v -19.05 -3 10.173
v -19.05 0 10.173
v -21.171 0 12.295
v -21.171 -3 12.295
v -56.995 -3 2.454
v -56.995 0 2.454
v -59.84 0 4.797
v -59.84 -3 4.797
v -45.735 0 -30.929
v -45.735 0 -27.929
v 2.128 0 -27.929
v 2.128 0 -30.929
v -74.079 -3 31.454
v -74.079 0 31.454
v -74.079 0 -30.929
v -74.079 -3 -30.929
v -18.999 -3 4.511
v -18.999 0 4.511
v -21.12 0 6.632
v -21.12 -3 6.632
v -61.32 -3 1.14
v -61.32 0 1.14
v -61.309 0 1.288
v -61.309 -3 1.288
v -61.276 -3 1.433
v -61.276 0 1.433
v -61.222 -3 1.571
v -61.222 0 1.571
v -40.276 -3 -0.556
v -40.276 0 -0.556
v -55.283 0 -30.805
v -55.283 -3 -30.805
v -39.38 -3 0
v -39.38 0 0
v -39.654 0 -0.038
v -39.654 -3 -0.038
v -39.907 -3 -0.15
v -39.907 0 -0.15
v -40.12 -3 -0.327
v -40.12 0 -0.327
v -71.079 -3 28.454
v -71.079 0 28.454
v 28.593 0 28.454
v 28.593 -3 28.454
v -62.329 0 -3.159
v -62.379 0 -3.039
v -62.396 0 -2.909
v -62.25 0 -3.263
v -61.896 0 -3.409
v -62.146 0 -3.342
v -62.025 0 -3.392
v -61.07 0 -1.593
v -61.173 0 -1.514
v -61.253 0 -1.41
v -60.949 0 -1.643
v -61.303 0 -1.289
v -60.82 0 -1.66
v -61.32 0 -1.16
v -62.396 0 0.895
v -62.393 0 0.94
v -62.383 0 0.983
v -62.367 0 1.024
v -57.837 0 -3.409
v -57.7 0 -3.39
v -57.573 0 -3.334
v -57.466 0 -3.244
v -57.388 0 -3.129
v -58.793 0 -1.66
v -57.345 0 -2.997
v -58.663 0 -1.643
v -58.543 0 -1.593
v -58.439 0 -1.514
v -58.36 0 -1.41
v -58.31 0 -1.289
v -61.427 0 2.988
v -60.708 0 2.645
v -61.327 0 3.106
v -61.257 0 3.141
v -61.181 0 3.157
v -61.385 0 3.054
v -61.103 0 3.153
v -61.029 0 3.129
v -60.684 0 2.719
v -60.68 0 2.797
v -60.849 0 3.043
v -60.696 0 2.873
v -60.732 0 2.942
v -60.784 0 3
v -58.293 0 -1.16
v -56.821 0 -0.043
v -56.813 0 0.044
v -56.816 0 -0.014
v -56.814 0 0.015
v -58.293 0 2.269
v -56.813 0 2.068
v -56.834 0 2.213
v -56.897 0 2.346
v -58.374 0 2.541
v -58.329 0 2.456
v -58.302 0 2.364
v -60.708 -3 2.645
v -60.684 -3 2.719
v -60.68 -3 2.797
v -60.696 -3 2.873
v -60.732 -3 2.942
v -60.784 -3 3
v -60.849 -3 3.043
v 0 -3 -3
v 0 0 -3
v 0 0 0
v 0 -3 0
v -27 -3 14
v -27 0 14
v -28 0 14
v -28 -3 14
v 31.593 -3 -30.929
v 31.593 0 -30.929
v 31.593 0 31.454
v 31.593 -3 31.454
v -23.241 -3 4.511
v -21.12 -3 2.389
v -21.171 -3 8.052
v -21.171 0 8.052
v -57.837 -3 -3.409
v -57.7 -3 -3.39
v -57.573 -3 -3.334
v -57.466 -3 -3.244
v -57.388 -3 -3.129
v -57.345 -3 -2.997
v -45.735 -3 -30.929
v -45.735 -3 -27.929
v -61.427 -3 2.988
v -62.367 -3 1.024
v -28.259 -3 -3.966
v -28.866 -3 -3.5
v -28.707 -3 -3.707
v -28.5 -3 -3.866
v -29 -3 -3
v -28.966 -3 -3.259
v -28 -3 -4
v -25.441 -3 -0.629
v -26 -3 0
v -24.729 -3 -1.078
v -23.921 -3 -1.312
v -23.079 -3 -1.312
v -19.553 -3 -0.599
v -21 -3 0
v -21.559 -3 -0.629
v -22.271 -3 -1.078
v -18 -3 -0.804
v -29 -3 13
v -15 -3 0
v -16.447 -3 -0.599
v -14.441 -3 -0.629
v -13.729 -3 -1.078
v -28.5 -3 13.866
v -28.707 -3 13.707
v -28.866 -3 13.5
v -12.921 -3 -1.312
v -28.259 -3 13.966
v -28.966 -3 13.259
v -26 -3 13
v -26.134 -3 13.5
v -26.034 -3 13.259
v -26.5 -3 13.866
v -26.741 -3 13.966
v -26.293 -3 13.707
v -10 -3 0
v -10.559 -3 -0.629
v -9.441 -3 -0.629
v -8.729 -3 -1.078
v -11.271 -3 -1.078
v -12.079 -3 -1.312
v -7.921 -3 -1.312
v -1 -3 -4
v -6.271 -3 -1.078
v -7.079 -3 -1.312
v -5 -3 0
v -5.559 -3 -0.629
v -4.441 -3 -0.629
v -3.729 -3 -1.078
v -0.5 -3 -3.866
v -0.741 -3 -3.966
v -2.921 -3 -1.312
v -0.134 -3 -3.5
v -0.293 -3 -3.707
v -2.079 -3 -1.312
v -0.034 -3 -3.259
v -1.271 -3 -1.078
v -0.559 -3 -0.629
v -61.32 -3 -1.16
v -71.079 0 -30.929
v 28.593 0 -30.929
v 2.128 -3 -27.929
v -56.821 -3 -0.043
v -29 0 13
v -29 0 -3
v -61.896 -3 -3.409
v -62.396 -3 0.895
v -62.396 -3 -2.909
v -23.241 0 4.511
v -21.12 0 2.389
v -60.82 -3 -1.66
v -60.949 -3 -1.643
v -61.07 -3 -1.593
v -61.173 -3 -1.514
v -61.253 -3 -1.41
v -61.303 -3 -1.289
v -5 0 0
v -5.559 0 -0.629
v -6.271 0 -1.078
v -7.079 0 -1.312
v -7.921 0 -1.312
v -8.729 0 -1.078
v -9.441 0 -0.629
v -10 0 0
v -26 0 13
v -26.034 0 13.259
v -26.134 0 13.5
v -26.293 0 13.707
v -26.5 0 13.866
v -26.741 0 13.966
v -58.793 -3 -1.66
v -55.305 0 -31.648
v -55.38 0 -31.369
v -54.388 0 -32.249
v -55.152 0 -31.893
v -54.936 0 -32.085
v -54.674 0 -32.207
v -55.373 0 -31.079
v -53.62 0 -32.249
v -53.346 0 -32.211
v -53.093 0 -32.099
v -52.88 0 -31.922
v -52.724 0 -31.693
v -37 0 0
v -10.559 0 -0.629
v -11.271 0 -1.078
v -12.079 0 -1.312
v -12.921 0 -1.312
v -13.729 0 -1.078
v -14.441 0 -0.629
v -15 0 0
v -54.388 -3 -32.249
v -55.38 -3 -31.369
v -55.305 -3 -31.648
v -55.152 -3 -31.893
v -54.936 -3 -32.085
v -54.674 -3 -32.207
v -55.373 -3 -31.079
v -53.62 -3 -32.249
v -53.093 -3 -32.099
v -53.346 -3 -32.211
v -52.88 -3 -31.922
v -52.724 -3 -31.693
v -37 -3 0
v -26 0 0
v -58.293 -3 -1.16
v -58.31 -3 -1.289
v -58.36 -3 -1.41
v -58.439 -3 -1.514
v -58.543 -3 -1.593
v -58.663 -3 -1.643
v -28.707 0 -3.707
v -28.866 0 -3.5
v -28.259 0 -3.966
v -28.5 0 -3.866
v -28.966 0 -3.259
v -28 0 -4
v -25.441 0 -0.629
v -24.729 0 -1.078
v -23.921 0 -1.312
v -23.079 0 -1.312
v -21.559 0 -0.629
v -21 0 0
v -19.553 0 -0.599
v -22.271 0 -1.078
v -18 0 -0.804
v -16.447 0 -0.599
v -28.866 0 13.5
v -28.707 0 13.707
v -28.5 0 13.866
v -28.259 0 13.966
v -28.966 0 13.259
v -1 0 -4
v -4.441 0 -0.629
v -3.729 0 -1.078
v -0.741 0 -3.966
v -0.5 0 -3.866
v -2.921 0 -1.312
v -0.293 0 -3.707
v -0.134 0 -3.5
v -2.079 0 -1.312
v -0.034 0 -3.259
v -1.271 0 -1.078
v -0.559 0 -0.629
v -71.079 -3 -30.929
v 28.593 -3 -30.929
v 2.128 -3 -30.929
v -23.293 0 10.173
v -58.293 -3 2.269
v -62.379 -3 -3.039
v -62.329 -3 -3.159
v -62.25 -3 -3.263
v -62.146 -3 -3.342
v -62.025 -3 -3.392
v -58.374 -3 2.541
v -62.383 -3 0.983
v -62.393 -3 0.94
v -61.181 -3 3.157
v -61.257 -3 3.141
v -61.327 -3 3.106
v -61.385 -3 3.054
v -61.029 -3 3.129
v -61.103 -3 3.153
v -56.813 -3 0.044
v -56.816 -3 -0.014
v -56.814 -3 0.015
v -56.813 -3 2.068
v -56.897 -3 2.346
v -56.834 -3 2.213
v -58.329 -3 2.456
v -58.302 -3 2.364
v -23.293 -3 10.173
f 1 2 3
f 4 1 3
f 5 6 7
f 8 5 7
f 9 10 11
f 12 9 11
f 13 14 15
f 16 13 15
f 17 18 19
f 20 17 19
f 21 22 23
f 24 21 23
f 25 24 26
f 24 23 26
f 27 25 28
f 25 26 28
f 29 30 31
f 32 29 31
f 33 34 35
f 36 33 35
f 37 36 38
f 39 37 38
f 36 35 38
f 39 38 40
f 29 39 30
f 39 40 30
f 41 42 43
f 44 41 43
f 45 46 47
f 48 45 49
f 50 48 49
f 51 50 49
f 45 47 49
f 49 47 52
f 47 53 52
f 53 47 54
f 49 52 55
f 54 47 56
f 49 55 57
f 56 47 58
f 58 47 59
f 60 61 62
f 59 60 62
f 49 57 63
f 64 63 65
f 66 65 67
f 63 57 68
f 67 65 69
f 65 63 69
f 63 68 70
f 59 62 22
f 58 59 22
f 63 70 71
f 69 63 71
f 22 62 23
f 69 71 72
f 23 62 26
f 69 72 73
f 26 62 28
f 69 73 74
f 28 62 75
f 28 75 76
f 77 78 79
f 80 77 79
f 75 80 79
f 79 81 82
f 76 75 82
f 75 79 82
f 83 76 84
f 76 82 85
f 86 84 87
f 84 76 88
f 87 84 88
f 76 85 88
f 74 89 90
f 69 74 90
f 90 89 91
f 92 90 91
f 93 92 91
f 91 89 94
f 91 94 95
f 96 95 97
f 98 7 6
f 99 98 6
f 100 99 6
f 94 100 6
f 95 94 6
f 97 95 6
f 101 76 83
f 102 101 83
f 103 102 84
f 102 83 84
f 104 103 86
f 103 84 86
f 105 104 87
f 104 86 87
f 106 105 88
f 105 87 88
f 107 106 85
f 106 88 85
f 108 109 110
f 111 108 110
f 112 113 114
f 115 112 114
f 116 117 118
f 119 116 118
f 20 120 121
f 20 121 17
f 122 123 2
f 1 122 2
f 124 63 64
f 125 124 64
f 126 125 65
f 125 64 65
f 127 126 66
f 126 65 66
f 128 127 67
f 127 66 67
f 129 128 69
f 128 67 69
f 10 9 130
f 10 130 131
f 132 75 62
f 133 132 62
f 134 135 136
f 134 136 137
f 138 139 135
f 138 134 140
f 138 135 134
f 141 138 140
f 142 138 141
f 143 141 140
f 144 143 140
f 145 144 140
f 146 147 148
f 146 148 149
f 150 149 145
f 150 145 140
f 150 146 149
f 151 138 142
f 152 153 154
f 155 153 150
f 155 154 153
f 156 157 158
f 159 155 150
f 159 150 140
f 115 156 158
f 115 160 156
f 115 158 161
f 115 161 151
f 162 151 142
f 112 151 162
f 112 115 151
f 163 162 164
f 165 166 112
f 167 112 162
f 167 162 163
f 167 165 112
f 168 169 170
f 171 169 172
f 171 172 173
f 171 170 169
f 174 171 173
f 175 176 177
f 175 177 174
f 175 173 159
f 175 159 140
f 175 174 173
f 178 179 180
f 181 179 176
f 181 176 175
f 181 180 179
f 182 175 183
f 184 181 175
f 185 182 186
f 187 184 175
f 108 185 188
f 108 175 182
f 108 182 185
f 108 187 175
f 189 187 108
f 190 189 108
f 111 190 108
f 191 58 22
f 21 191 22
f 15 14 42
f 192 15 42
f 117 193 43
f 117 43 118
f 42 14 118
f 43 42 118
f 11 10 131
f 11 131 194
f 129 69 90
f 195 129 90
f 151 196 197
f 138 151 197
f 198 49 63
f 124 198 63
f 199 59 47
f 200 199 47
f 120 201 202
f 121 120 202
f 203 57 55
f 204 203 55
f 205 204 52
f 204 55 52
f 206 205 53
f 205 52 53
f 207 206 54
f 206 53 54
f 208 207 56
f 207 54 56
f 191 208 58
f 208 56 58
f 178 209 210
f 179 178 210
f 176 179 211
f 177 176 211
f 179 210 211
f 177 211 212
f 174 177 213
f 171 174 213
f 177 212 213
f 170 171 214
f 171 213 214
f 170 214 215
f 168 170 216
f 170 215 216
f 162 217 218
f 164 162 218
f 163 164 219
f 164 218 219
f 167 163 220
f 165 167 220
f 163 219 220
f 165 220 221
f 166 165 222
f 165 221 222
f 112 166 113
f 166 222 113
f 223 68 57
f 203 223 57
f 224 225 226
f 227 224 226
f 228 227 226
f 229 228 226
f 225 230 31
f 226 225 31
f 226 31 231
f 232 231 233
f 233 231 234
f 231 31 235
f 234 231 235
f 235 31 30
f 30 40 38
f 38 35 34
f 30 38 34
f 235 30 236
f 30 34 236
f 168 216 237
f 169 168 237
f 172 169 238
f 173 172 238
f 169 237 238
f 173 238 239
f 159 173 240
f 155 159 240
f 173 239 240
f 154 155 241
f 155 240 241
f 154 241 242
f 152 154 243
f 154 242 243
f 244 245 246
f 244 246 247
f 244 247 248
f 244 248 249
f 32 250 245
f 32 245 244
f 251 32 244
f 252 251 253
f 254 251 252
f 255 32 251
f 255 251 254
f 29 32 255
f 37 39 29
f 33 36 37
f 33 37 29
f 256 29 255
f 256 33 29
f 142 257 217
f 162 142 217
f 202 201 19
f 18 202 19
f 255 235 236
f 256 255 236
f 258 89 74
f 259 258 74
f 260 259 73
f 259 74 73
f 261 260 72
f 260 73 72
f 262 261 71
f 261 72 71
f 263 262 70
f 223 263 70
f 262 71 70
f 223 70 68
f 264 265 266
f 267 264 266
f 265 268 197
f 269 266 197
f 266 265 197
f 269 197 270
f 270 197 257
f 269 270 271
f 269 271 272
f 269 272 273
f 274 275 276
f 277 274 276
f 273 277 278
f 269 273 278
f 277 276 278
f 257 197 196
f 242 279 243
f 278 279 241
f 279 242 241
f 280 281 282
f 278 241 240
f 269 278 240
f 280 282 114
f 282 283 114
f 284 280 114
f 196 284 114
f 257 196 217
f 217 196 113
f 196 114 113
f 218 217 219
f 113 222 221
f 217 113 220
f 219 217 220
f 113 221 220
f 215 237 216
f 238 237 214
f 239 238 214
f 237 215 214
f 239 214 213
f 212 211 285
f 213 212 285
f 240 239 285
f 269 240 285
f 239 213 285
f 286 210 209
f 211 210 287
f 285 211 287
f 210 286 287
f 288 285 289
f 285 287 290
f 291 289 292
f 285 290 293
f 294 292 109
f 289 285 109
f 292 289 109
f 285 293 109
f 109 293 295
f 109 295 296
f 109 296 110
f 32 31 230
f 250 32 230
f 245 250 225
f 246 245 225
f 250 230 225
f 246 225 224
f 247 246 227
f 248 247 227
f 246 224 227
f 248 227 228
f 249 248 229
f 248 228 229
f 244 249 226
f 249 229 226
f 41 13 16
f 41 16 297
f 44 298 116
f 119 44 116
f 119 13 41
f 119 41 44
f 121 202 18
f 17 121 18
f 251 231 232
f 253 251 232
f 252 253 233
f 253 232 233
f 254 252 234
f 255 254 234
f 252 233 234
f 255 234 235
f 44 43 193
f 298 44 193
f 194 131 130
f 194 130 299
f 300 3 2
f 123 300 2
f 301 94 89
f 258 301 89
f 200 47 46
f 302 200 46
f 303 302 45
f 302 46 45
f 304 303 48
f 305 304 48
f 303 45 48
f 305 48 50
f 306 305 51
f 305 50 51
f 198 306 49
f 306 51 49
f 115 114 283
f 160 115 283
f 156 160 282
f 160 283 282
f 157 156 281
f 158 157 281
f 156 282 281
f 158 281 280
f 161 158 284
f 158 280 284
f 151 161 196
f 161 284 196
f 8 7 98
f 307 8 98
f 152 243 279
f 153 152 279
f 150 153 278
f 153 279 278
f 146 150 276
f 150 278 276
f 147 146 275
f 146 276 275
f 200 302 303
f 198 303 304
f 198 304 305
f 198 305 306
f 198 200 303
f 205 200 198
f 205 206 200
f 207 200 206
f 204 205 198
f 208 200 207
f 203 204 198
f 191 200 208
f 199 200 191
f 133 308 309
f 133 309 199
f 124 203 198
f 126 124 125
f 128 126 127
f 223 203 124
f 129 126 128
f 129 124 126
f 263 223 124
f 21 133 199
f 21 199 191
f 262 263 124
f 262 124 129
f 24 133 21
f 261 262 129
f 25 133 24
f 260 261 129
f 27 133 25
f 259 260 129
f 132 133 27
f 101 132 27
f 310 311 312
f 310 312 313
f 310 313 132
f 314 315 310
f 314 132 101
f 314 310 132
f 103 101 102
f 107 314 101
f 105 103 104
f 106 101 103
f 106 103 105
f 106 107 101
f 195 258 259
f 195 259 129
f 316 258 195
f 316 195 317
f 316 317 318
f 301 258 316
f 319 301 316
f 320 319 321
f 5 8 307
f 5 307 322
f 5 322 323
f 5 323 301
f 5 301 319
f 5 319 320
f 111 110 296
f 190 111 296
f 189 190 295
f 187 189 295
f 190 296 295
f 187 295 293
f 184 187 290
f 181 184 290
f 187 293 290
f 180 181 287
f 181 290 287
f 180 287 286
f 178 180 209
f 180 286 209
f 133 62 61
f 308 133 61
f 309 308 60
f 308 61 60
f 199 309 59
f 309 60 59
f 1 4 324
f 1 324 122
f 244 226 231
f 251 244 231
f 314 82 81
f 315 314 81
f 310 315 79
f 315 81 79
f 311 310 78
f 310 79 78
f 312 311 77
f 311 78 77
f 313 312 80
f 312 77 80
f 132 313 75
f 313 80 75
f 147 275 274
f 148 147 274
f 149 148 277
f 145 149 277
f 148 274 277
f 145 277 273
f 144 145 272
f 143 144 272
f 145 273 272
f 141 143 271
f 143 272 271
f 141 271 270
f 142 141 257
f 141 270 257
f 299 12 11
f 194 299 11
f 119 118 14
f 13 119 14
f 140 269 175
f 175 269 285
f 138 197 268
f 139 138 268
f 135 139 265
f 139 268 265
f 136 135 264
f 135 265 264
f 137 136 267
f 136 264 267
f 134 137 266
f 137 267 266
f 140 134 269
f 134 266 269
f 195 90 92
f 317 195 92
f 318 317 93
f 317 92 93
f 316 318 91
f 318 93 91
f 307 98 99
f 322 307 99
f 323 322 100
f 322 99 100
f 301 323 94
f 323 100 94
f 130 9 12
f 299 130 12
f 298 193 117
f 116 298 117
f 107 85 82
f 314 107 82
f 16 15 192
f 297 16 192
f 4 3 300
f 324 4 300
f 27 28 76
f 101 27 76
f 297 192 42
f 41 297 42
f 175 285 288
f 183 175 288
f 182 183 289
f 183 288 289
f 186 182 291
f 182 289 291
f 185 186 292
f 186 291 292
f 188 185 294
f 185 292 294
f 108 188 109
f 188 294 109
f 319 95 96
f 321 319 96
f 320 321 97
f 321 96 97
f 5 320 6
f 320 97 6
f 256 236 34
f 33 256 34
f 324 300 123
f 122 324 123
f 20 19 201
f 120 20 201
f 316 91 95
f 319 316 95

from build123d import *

# Parameters (mm, degrees)
F0_W     = 99.672524
F0_H     = 3
F0_W_2   = 47.863317
F1_DEPTH = 3


with BuildPart() as f1:
    # F0 (on Front) → F1 (new body)
    with BuildSketch(Plane.XZ):
        with BuildLine():
            ThreePointArc((0, 0), (-2.5, -1.341688), (-5, 0))
            ThreePointArc((-5, 0), (-7.5, -1.341688), (-10, 0))
            ThreePointArc((-10, 0), (-12.5, -1.341688), (-15, 0))
            ThreePointArc((-15, 0), (-18, -0.803848), (-21, 0))
            ThreePointArc((-21, 0), (-23.5, -1.341688), (-26, 0))
            Line((-26, 0), (-26, 13))
            ThreePointArc((-26, 13), (-26.292893, 13.707107), (-27, 14))
            Line((-27, 14), (-28, 14))
            ThreePointArc((-28, 14), (-28.707107, 13.707107), (-29, 13))
            Line((-29, 13), (-29, -3))
            ThreePointArc((-29, -3), (-28.707107, -3.707107), (-28, -4))
            Line((-28, -4), (-1, -4))
            ThreePointArc((-1, -4), (-0.292893, -3.707107), (0, -3))
            Line((0, -3), (0, 0))
        make_face()
        with BuildLine():
            Line((-37, 0), (-39.379826, 0))
            ThreePointArc((-39.379826, 0), (-39.906873, -0.150163), (-40.275633, -0.555556))
            Line((-40.275633, -0.555556), (-55.283355, -30.804587))
            ThreePointArc((-55.283355, -30.804587), (-55.237385, -31.776077), (-54.387548, -32.249031))
            Line((-54.387548, -32.249031), (-53.620174, -32.249031))
            ThreePointArc((-53.620174, -32.249031), (-53.093127, -32.098868), (-52.724367, -31.693475))
            Line((-52.724367, -31.693475), (-37, 0))
        make_face()
        Polygon((-18.99884, 4.510566), (-21.12016, 6.631886), (-23.241481, 4.510566), (-21.12016, 2.389246), align=None)
        Polygon((-19.049909, 10.173308), (-21.171229, 12.294628), (-23.292549, 10.173308), (-21.171229, 8.051987), align=None)
        Polygon((-71.079193, 28.454014), (-71.079193, 31.454014), (-74.079193, 31.454014), (-74.079193, -30.928904), (-71.079193, -30.928904), align=None)
        with Locations((-21.242931, 29.954014)):
            Rectangle(F0_W, F0_H)
        Polygon((31.593331, 31.454014), (28.593331, 31.454014), (28.593331, 28.454014), (28.593331, -30.928904), (31.593331, -30.928904), align=None)
        with Locations((-21.803254, -29.428904)):
            Rectangle(F0_W_2, F0_H)
        with BuildLine():
            Line((-56.995024, 2.454279), (-59.84003, 4.797225))
            Line((-59.84003, 4.797225), (-58.373594, 2.54117))
            ThreePointArc((-58.373594, 2.54117), (-58.313436, 2.410784), (-58.292816, 2.268676))
            Line((-58.292816, 2.268676), (-58.292816, -1.160077))
            ThreePointArc((-58.292816, -1.160077), (-58.439263, -1.513631), (-58.792816, -1.660077))
            Line((-58.792816, -1.660077), (-60.819657, -1.660077))
            ThreePointArc((-60.819657, -1.660077), (-61.17321, -1.513631), (-61.319657, -1.160077))
            Line((-61.319657, -1.160077), (-61.319657, 1.139937))
            ThreePointArc((-61.319657, 1.139937), (-61.294883, 1.361145), (-61.221791, 1.571392))
            Line((-61.221791, 1.571392), (-60.708477, 2.644687))
            ThreePointArc((-60.708477, 2.644687), (-60.696282, 2.872824), (-60.848976, 3.042765))
            Line((-60.848976, 3.042765), (-61.029262, 3.128988))
            ThreePointArc((-61.029262, 3.128988), (-61.257399, 3.141184), (-61.42734, 2.98849))
            Line((-61.42734, 2.98849), (-62.366769, 1.024225))
            ThreePointArc((-62.366769, 1.024225), (-62.388588, 0.961466), (-62.395982, 0.895435))
            Line((-62.395982, 0.895435), (-62.395982, -1.660077))
            Line((-62.395982, -1.660077), (-62.395982, -2.909411))
            ThreePointArc((-62.395982, -2.909411), (-62.249536, -3.262964), (-61.895982, -3.409411))
            Line((-61.895982, -3.409411), (-57.837342, -3.409411))
            ThreePointArc((-57.837342, -3.409411), (-57.51618, -3.292627), (-57.345043, -2.996831))
            Line((-57.345043, -2.996831), (-56.820579, -0.043371))
            ThreePointArc((-56.820579, -0.043371), (-56.814806, 0.00017), (-56.812877, 0.04405))
            Line((-56.812877, 0.04405), (-56.812877, 2.068314))
            ThreePointArc((-56.812877, 2.068314), (-56.860701, 2.281707), (-56.995024, 2.454279))
        make_face()
    extrude(amount=F1_DEPTH)


solid = f1.part
